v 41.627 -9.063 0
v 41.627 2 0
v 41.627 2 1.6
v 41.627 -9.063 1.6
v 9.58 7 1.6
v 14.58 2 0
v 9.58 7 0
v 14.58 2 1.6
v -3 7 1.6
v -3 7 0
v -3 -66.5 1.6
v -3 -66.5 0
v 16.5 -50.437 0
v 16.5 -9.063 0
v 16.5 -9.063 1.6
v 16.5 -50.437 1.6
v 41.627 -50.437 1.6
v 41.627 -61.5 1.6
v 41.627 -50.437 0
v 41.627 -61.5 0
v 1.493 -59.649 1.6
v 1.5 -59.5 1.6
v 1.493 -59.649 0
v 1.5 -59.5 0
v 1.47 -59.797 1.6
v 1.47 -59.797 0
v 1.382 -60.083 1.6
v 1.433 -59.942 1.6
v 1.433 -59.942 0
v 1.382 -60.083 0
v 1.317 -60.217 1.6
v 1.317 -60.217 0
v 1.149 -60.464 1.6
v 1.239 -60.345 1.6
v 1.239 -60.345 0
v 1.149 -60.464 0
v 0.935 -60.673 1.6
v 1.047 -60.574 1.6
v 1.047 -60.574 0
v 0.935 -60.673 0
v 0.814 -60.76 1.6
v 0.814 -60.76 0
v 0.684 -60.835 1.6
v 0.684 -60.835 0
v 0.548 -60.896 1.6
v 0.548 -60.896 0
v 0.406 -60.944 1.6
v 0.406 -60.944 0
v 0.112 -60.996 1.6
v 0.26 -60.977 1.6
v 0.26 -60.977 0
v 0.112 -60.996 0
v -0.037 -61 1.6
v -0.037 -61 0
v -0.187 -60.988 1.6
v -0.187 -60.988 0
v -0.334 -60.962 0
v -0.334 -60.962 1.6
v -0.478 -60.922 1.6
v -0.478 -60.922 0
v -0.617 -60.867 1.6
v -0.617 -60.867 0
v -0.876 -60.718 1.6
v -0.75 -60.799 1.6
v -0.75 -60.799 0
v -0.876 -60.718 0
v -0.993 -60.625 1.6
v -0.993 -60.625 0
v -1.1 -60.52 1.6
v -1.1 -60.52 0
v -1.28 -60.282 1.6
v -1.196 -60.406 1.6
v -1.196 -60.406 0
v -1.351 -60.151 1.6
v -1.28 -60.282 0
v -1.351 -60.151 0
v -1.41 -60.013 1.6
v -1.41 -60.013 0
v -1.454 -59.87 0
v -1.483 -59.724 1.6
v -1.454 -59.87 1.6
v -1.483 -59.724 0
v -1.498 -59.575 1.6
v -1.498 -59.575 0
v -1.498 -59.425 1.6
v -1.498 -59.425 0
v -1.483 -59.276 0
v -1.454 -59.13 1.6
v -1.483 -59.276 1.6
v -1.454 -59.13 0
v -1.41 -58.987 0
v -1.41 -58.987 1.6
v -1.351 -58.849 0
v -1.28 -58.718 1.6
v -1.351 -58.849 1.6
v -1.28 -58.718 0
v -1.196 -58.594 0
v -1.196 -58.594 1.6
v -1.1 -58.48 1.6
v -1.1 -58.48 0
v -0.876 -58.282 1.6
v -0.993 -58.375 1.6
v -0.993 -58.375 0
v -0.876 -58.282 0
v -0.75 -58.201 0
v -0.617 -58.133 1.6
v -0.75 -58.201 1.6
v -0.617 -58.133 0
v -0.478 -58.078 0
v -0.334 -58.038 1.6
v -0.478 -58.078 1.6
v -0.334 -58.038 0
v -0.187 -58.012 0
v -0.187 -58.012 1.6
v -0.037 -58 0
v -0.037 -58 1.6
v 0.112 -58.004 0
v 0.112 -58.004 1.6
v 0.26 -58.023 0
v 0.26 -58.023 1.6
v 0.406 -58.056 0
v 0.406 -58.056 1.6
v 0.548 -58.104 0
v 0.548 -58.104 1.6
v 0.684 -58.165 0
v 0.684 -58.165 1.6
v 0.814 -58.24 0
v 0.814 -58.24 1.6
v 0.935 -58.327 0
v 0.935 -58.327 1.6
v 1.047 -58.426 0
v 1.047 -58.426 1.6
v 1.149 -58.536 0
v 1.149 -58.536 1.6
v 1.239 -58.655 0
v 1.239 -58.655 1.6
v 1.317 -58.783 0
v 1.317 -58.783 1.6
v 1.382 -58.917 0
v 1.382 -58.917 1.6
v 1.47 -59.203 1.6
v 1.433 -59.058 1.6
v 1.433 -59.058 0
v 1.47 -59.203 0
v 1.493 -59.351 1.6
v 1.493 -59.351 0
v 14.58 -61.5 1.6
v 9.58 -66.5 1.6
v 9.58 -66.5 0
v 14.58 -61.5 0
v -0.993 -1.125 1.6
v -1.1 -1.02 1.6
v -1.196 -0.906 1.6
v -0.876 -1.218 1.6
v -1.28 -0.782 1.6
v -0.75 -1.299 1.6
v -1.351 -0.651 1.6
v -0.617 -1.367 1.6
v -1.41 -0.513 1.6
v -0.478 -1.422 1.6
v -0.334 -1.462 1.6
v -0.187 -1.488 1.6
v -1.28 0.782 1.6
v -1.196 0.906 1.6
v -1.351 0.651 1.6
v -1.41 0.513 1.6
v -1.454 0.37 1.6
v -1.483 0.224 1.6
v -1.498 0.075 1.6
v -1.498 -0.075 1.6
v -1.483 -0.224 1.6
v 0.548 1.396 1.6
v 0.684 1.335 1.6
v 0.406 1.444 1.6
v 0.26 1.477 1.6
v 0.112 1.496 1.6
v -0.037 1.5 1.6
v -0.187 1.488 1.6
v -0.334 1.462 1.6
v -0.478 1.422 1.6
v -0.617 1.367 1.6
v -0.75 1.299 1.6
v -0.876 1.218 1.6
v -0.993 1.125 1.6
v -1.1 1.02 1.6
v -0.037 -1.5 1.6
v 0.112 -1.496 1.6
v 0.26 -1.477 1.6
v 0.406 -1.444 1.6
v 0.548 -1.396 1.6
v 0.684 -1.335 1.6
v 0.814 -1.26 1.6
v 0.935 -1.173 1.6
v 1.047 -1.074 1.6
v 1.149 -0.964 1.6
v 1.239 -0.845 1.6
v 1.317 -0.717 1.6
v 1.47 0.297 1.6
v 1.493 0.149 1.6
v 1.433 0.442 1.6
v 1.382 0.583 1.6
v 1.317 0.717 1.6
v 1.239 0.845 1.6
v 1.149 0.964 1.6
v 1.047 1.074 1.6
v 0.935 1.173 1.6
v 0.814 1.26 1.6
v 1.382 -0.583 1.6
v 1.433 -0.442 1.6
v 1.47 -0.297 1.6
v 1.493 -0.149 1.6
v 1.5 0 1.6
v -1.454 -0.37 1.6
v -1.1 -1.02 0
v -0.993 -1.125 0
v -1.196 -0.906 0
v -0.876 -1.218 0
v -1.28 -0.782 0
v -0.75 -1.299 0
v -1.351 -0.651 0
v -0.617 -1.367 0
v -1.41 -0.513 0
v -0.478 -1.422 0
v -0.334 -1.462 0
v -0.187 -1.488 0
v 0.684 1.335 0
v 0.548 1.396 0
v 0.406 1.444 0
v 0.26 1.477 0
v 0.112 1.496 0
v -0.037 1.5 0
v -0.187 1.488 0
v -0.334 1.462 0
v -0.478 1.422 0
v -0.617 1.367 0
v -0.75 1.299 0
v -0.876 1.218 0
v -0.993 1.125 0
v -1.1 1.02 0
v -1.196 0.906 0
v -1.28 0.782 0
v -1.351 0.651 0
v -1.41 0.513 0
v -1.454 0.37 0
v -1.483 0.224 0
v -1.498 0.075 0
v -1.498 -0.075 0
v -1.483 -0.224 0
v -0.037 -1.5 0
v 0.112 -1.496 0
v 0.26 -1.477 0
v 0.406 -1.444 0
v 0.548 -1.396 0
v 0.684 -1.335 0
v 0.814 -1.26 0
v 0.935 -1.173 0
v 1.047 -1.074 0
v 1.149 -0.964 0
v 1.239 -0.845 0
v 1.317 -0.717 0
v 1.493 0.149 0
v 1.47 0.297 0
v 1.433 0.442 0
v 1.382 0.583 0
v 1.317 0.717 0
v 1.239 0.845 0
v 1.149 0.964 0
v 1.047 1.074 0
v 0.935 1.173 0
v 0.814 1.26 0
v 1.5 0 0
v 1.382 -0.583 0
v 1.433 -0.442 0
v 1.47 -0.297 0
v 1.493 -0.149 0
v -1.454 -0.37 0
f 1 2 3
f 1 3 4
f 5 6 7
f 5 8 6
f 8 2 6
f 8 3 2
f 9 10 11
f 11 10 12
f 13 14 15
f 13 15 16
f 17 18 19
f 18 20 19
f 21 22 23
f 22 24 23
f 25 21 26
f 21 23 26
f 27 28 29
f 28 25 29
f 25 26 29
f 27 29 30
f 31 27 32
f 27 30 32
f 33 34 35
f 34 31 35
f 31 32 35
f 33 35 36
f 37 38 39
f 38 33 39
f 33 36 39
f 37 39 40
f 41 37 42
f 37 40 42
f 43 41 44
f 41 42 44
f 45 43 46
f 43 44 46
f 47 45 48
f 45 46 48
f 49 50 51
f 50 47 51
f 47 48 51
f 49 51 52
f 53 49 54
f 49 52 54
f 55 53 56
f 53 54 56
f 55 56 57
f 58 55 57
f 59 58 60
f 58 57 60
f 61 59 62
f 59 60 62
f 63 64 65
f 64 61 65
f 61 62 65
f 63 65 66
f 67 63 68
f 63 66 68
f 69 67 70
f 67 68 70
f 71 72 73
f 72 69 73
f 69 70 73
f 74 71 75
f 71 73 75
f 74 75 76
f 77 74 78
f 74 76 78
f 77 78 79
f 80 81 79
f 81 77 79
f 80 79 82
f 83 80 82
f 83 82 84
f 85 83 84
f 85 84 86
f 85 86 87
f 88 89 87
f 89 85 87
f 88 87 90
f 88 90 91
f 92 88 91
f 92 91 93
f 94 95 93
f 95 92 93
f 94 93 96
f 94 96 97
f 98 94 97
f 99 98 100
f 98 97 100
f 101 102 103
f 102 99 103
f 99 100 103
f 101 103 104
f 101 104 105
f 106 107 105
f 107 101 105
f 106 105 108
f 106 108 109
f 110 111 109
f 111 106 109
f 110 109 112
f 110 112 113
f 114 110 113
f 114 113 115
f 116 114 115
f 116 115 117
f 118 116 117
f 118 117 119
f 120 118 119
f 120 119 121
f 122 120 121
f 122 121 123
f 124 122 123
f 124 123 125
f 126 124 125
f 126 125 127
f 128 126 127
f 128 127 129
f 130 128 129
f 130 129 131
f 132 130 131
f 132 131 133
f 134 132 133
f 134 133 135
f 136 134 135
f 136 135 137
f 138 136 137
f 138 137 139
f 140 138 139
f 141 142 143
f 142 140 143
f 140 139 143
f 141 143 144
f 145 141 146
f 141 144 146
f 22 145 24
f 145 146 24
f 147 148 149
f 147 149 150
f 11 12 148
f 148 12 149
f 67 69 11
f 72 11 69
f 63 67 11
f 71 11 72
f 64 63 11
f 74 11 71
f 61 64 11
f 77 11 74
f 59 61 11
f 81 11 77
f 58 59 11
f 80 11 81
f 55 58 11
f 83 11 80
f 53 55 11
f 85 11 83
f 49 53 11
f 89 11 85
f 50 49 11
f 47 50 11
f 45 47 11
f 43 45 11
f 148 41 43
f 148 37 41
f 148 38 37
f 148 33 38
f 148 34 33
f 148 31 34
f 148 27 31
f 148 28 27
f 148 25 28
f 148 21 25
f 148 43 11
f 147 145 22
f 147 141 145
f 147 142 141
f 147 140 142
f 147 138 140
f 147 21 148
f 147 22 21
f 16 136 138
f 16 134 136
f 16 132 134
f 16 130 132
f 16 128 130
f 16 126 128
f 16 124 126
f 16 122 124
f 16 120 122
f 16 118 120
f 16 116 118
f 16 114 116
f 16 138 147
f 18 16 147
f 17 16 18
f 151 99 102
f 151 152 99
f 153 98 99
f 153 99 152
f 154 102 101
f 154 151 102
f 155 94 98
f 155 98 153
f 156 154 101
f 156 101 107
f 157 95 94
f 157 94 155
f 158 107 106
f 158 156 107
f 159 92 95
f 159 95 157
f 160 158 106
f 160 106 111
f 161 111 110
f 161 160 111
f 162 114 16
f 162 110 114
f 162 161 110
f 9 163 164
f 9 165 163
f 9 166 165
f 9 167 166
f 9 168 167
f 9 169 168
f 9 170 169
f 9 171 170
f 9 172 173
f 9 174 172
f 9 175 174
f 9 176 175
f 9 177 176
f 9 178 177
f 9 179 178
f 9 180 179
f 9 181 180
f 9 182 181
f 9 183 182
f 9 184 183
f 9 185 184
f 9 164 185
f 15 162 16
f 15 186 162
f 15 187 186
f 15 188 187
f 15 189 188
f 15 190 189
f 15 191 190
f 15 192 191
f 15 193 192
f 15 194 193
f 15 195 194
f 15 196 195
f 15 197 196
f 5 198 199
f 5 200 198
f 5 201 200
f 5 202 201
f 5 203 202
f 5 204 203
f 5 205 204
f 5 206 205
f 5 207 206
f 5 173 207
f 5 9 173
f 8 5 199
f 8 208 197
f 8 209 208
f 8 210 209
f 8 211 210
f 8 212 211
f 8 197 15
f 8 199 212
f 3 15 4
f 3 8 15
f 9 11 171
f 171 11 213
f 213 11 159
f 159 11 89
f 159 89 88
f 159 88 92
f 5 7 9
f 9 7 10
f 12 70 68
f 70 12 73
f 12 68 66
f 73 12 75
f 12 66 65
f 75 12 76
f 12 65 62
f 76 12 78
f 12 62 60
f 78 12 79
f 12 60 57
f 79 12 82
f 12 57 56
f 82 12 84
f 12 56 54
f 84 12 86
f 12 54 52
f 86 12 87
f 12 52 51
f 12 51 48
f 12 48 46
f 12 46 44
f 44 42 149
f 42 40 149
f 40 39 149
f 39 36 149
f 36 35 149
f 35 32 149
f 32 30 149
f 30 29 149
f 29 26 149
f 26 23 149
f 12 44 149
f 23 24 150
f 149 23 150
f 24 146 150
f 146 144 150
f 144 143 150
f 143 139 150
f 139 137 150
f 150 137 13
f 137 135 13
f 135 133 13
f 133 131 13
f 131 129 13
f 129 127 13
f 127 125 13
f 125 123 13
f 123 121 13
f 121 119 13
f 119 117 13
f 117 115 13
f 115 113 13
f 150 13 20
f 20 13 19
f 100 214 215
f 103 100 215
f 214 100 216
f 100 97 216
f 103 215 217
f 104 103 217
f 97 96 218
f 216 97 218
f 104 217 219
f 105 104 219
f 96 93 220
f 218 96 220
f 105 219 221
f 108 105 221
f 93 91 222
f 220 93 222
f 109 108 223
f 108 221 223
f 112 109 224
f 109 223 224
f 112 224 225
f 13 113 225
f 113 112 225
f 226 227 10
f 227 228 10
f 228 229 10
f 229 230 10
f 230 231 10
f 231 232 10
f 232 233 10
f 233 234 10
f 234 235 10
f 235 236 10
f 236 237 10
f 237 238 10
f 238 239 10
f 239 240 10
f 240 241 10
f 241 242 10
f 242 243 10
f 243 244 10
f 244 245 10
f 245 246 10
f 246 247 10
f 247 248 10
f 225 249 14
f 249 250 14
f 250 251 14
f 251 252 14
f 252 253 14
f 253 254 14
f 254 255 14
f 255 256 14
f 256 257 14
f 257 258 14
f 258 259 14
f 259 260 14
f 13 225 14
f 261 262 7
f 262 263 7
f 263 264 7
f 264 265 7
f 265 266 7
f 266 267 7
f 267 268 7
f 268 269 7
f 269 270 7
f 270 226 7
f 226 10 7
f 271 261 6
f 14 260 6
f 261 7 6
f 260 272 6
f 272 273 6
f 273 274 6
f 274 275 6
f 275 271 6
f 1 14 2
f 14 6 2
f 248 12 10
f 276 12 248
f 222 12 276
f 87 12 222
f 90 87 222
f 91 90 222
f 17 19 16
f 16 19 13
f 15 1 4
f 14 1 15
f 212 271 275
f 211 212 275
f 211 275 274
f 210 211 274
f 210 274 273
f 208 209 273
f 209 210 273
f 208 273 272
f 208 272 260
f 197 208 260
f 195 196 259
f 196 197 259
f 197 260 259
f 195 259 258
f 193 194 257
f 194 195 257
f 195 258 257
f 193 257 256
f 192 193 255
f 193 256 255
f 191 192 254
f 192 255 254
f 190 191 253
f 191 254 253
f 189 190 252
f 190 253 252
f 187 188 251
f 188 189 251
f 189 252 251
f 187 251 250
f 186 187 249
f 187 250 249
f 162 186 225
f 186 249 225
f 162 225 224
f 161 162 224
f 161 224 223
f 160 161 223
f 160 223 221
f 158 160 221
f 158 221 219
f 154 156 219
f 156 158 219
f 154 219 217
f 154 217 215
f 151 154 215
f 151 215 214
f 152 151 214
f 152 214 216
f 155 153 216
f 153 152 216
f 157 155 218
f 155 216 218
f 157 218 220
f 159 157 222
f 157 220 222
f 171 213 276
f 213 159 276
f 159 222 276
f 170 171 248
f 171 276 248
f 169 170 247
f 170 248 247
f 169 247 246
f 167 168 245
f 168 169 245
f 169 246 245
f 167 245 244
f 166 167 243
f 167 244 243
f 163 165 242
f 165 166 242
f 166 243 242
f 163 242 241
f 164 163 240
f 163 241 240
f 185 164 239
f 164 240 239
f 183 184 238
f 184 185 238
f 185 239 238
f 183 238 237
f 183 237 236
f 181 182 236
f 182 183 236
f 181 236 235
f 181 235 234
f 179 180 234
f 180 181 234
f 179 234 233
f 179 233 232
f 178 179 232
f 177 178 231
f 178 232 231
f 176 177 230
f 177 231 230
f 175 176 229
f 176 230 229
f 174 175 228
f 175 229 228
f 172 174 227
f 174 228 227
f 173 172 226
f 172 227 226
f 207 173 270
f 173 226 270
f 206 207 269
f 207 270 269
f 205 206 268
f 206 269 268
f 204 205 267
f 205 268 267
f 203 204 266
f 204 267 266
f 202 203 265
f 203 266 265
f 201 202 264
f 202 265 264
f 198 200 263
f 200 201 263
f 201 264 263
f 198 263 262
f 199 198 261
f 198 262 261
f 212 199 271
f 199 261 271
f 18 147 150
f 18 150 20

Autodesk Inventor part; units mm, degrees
ref_plane "YZ Plane" through (0, 0, 0) normal (1, 0, 0) x (0, 1, 0)
ref_plane "XZ Plane" through (0, 0, 0) normal (0, 1, 0) x (-1, 0, 0)
ref_plane "XY Plane" through (0, 0, 0) normal (0, 0, 1) x (1, 0, 0)
sketch "Skizze1" plane through (0, 0, 0) normal (0, 0, 1) x (1, 0, 0)
  arc A0 (3, 7) -> (-3, 1) centre (3, 1) ccw projected
  line L0 (16.5, 7) -> (3, 7) projected
  line L1 (16.5, 7) -> (40.4545, 7) projected
  line L2 (-3, 0) -> (-3, -59.5) projected
  line L3 (-3, 1) -> (-3, 0) projected
  arc A1 (-3, -60.5) -> (3, -66.5) centre (3, -60.5) ccw projected
  line L4 (-3, -59.5) -> (-3, -60.5) projected
  line L5 (3, -66.5) -> (16.5, -66.5) projected
  line L6 (16.5, -56.3086) -> (5, -56.3086) projected
  line L7 (27, -49) -> (27, -62.5) projected
  line L8 (27, -49) -> (16.5, -49) projected
  line L9 (16.5, -49) -> (16.5, -56.3086) projected
  line L10 (16.5, -56.3086) -> (5, -56.3086) projected
  line L11 (5, -56.3086) -> (5, -37.5) projected
  line L12 (5, -37.5) -> (3, -37.5) projected
  line L13 (3, -37.5) -> (3, -22) projected
  line L14 (3, -22) -> (5, -22) projected
  line L15 (5, -22) -> (5, -3.0505) projected
  line L16 (5, -3.0505) -> (16.5, -3.0505) projected
  line L17 (16.5, -3.0505) -> (16.5, -10.5) projected
  line L18 (27, -10.5) -> (16.5, -10.5) projected
  line L19 (27, 3) -> (27, -10.5) projected
  line L20 (27, 3) -> (16.5, 3) projected
  line L21 (16.5, 3) -> (16.5, 7) projected
  line L22 (16.5, 7) -> (3, 7) projected
  arc A2 (3, 7) -> (-3, 1) centre (3, 1) ccw projected
  line L23 (-3, 1) -> (-3, 0) projected
  circle A3 centre (0, 0) radius 3 projected
  line L24 (-3, 0) -> (-3, -59.5) projected
  circle A4 centre (0, -59.5) radius 3 projected
  line L25 (-3, -59.5) -> (-3, -60.5) projected
  arc A5 (-3, -60.5) -> (3, -66.5) centre (3, -60.5) ccw projected
  line L26 (3, -66.5) -> (16.5, -66.5) projected
  line L27 (16.5, -66.5) -> (16.5, -62.5) projected
  line L28 (16.5, -62.5) -> (27, -62.5) projected
  line L29 (-3, 7) -> (16.5, 7)
  line L30 (16.5, -66.5) -> (-3, -66.5)
  line L31 (-3, -66.5) -> (-3, 7)
  line L32 (16.5, 7) -> (41.6272, 7)
  line L33 (41.6272, 7) -> (41.6272, -9.0628)
  line L34 (41.6272, -9.0628) -> (16.5, -9.0628)
  line L35 (16.5, -66.5) -> (41.6272, -66.5)
  line L36 (41.6272, -66.5) -> (41.6272, -50.4372)
  line L37 (41.6272, -50.4372) -> (16.5, -50.4372)
  circle A6 centre (0, 0) radius 1.5 projected
  circle A7 centre (0, -59.5) radius 1.5 projected
  line L38 (16.5, -50.4372) -> (16.5, -9.0628)
  point P0 (0, 0)
  dimension "d5" = 7
  dimension "d6" = 7
extrude "Extrusion1" add sketch "Skizze1" along normal blind 1.6 contours A3 | A4 | L0 L21 L20 L19 L34 L17 L16 L15 L14 L13 L12 L11 L6 L9 L37 L7 L28 L27 L5 A1 L4 L2 L3 A0 | A0 L31 L29 | L1 L32 L33 L34 L19 L20 L21 | A1 L30 L31 | L17 L38 L9 L6 L11 L12 L13 L14 L15 L16 | L27 L28 L7 L37 L36 L35
sketch "Skizze2" plane through (0, 0, 1.6) normal (0, 0, 1) x (1, 0, 0)
  line L0 (-3, -66.5) -> (41.6272, -66.5) projected
  line L1 (41.6272, -9.0628) -> (41.6272, 7) projected
  line L2 (41.6272, 7) -> (-3, 7) projected
  line L3 (41.6272, 2) -> (14.5797, 2)
  line L4 (14.5797, 2) -> (9.5797, 7)
  line L5 (14.5797, 2) -> (21.6508, 2) construction
  dimension "d2" = 135
  dimension "d7" = 5
extrude "Extrusion2" cut sketch "Skizze2" against normal through all
ref_plane "Arbeitsebene1" through (-3, -29.75, 1.6) normal (0, 1, 0) x (1, 0, 0)
mirror "Spiegeln1" about plane through (-3, -29.75, 1.6) normal (0, 1, 0) of "Extrusion2"
properties part number "bottom_sensor"
